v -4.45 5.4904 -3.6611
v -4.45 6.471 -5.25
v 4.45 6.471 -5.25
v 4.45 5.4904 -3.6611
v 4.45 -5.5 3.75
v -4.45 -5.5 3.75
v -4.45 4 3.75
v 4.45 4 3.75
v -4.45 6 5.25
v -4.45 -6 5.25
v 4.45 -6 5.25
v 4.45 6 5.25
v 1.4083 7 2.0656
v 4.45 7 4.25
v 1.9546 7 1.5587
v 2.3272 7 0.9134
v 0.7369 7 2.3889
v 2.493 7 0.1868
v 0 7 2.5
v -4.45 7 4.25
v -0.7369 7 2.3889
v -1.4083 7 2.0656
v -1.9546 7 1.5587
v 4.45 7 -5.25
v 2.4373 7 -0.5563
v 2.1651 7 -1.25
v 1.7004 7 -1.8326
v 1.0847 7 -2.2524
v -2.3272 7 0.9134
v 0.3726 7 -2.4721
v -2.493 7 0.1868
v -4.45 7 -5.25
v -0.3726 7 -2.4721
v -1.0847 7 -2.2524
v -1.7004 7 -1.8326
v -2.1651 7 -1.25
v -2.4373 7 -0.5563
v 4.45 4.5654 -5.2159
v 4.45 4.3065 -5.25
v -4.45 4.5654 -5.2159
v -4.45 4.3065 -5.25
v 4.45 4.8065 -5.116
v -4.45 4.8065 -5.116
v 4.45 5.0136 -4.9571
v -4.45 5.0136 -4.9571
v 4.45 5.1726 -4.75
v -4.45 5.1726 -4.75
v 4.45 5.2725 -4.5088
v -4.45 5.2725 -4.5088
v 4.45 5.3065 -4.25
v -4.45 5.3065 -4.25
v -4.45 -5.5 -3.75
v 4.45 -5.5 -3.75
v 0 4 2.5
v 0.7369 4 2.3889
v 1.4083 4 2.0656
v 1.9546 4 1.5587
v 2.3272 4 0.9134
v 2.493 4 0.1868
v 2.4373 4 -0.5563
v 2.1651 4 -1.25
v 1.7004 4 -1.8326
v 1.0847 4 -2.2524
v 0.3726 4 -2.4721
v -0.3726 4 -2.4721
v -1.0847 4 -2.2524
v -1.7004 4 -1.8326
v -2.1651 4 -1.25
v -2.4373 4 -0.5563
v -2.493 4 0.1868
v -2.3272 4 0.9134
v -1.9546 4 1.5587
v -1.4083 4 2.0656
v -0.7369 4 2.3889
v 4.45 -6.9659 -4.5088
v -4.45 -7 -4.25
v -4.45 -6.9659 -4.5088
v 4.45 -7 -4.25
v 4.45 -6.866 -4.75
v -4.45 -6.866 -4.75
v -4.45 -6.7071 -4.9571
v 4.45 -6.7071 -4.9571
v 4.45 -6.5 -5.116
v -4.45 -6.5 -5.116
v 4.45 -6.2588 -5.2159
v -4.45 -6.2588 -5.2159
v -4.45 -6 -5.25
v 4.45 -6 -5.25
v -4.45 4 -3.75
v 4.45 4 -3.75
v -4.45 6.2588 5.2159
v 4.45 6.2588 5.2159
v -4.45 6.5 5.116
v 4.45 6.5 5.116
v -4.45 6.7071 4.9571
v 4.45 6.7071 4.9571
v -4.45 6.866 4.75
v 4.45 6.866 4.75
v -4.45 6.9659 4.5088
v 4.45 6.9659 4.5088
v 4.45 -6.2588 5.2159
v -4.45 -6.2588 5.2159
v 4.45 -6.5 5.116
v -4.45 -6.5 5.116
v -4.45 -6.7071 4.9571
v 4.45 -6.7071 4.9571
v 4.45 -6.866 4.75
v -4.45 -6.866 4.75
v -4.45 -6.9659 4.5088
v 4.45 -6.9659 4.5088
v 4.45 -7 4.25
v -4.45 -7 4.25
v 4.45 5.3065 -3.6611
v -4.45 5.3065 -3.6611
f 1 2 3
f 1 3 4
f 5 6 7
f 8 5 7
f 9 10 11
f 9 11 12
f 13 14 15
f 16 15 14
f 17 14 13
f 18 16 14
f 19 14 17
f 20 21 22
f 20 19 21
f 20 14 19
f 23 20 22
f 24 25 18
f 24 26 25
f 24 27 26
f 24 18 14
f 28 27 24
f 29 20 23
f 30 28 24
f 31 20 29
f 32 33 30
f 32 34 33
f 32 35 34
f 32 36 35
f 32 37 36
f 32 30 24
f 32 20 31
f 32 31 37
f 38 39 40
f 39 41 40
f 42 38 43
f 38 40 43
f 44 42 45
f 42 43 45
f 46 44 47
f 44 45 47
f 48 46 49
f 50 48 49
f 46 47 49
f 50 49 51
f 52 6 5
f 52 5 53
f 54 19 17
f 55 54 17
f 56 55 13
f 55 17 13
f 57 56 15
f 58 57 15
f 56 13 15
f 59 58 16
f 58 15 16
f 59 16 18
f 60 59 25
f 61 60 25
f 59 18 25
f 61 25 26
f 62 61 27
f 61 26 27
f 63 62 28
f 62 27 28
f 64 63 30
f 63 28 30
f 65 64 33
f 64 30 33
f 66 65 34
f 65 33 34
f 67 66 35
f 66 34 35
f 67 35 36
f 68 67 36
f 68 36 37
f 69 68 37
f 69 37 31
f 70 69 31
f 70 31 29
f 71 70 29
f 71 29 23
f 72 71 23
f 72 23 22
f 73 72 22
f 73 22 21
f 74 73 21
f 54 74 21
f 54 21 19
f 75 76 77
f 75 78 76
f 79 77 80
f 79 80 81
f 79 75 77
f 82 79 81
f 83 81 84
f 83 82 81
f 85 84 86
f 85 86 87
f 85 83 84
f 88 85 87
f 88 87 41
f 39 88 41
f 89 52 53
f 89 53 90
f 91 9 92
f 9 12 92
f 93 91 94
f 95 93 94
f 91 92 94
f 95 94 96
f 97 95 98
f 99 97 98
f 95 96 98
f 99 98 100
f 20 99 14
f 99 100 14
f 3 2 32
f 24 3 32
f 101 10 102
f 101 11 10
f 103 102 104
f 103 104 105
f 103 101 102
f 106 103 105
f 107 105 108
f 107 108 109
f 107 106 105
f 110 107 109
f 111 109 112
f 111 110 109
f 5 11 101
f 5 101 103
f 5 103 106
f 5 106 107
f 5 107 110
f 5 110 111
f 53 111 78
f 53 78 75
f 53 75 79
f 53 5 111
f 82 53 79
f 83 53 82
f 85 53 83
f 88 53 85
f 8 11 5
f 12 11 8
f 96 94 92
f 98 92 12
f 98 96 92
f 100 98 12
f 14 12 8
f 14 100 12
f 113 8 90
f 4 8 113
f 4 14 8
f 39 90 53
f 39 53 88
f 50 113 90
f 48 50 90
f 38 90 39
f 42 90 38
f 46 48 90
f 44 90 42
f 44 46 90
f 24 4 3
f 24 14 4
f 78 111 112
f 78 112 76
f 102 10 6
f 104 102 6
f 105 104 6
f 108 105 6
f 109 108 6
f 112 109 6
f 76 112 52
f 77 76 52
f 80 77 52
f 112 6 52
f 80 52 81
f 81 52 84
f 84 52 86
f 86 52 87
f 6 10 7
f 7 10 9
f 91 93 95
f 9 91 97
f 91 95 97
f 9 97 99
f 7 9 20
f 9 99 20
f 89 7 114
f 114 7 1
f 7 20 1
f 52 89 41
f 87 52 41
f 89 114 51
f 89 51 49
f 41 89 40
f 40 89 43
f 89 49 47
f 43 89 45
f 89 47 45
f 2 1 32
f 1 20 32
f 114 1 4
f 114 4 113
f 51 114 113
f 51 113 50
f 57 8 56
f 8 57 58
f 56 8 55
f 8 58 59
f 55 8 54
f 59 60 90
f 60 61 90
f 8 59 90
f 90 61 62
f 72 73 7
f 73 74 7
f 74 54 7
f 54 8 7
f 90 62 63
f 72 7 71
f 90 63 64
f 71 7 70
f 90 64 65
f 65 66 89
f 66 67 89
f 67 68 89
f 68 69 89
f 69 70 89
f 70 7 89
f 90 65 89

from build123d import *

# Parameters (mm, degrees)
EXTRUDE_1_DEPTH          = 4.45
EXTRUDE_1_DEPTH_BACK     = 4.45
SKETCH_1_W               = 10.5
SKETCH_1_H               = 14
SKETCH_1_W_2             = 7.5
SKETCH_1_H_2             = 9.5
SKETCH_2_R               = 2.5
CUT_EXTRUDE_1_DEPTH      = 5
CUT_EXTRUDE_2_DEPTH      = 13.480885385
CUT_EXTRUDE_2_DEPTH_BACK = 13.480885385
FILLET_1_R               = 1


with BuildPart() as part:
    # 草图1 → 凸台-拉伸1 (new, two sides: drawn at the far end of the back side and taken through both)
    with BuildSketch(Plane(origin=(0, 0, 0), x_dir=(0, 0, -1), z_dir=(1, 0, 0)).offset(-EXTRUDE_1_DEPTH_BACK)):
        Rectangle(SKETCH_1_W, SKETCH_1_H)
        with Locations((0, -0.75)):
            Rectangle(SKETCH_1_W_2, SKETCH_1_H_2, mode=Mode.SUBTRACT)
    extrude(amount=EXTRUDE_1_DEPTH + EXTRUDE_1_DEPTH_BACK)

    # 草图2 → 切除-拉伸1 (cut)
    with BuildSketch(Plane(origin=(0, 7, 0), x_dir=(1, 0, 0), z_dir=(0, 1, 0))):
        Circle(SKETCH_2_R)
    extrude(amount=-CUT_EXTRUDE_1_DEPTH, mode=Mode.SUBTRACT)

    # 草图3 → 切除-拉伸2 (cut, two sides: drawn at the far end of the back side and taken through both)
    with BuildSketch(Plane(origin=(4.45, 0, 0), x_dir=(0, 0, -1), z_dir=(1, 0, 0)).offset(-CUT_EXTRUDE_2_DEPTH_BACK)):
        Polygon((42.829414647, 29.662513803), (5.25, 6.470985869), (3.661056498, 5.490395087), (3.661056498, 5.306534315), (5.25, 5.306534315), (49.409476594, 5.306534315), (134.671683999, 28.341149153), (128.091622051, 52.697128641), align=None)
    extrude(amount=CUT_EXTRUDE_2_DEPTH + CUT_EXTRUDE_2_DEPTH_BACK, mode=Mode.SUBTRACT)

    # 圆角1
    fillet_1_edges = [part.edges().sort_by_distance(p)[0] for p in [
        (0, -7, -5.25),
        (0, -7, 5.25),
        (0, 7, 5.25),
        (0, 5.306534315, -5.25),
    ]]
    fillet(fillet_1_edges, radius=FILLET_1_R)


solid = part.part
